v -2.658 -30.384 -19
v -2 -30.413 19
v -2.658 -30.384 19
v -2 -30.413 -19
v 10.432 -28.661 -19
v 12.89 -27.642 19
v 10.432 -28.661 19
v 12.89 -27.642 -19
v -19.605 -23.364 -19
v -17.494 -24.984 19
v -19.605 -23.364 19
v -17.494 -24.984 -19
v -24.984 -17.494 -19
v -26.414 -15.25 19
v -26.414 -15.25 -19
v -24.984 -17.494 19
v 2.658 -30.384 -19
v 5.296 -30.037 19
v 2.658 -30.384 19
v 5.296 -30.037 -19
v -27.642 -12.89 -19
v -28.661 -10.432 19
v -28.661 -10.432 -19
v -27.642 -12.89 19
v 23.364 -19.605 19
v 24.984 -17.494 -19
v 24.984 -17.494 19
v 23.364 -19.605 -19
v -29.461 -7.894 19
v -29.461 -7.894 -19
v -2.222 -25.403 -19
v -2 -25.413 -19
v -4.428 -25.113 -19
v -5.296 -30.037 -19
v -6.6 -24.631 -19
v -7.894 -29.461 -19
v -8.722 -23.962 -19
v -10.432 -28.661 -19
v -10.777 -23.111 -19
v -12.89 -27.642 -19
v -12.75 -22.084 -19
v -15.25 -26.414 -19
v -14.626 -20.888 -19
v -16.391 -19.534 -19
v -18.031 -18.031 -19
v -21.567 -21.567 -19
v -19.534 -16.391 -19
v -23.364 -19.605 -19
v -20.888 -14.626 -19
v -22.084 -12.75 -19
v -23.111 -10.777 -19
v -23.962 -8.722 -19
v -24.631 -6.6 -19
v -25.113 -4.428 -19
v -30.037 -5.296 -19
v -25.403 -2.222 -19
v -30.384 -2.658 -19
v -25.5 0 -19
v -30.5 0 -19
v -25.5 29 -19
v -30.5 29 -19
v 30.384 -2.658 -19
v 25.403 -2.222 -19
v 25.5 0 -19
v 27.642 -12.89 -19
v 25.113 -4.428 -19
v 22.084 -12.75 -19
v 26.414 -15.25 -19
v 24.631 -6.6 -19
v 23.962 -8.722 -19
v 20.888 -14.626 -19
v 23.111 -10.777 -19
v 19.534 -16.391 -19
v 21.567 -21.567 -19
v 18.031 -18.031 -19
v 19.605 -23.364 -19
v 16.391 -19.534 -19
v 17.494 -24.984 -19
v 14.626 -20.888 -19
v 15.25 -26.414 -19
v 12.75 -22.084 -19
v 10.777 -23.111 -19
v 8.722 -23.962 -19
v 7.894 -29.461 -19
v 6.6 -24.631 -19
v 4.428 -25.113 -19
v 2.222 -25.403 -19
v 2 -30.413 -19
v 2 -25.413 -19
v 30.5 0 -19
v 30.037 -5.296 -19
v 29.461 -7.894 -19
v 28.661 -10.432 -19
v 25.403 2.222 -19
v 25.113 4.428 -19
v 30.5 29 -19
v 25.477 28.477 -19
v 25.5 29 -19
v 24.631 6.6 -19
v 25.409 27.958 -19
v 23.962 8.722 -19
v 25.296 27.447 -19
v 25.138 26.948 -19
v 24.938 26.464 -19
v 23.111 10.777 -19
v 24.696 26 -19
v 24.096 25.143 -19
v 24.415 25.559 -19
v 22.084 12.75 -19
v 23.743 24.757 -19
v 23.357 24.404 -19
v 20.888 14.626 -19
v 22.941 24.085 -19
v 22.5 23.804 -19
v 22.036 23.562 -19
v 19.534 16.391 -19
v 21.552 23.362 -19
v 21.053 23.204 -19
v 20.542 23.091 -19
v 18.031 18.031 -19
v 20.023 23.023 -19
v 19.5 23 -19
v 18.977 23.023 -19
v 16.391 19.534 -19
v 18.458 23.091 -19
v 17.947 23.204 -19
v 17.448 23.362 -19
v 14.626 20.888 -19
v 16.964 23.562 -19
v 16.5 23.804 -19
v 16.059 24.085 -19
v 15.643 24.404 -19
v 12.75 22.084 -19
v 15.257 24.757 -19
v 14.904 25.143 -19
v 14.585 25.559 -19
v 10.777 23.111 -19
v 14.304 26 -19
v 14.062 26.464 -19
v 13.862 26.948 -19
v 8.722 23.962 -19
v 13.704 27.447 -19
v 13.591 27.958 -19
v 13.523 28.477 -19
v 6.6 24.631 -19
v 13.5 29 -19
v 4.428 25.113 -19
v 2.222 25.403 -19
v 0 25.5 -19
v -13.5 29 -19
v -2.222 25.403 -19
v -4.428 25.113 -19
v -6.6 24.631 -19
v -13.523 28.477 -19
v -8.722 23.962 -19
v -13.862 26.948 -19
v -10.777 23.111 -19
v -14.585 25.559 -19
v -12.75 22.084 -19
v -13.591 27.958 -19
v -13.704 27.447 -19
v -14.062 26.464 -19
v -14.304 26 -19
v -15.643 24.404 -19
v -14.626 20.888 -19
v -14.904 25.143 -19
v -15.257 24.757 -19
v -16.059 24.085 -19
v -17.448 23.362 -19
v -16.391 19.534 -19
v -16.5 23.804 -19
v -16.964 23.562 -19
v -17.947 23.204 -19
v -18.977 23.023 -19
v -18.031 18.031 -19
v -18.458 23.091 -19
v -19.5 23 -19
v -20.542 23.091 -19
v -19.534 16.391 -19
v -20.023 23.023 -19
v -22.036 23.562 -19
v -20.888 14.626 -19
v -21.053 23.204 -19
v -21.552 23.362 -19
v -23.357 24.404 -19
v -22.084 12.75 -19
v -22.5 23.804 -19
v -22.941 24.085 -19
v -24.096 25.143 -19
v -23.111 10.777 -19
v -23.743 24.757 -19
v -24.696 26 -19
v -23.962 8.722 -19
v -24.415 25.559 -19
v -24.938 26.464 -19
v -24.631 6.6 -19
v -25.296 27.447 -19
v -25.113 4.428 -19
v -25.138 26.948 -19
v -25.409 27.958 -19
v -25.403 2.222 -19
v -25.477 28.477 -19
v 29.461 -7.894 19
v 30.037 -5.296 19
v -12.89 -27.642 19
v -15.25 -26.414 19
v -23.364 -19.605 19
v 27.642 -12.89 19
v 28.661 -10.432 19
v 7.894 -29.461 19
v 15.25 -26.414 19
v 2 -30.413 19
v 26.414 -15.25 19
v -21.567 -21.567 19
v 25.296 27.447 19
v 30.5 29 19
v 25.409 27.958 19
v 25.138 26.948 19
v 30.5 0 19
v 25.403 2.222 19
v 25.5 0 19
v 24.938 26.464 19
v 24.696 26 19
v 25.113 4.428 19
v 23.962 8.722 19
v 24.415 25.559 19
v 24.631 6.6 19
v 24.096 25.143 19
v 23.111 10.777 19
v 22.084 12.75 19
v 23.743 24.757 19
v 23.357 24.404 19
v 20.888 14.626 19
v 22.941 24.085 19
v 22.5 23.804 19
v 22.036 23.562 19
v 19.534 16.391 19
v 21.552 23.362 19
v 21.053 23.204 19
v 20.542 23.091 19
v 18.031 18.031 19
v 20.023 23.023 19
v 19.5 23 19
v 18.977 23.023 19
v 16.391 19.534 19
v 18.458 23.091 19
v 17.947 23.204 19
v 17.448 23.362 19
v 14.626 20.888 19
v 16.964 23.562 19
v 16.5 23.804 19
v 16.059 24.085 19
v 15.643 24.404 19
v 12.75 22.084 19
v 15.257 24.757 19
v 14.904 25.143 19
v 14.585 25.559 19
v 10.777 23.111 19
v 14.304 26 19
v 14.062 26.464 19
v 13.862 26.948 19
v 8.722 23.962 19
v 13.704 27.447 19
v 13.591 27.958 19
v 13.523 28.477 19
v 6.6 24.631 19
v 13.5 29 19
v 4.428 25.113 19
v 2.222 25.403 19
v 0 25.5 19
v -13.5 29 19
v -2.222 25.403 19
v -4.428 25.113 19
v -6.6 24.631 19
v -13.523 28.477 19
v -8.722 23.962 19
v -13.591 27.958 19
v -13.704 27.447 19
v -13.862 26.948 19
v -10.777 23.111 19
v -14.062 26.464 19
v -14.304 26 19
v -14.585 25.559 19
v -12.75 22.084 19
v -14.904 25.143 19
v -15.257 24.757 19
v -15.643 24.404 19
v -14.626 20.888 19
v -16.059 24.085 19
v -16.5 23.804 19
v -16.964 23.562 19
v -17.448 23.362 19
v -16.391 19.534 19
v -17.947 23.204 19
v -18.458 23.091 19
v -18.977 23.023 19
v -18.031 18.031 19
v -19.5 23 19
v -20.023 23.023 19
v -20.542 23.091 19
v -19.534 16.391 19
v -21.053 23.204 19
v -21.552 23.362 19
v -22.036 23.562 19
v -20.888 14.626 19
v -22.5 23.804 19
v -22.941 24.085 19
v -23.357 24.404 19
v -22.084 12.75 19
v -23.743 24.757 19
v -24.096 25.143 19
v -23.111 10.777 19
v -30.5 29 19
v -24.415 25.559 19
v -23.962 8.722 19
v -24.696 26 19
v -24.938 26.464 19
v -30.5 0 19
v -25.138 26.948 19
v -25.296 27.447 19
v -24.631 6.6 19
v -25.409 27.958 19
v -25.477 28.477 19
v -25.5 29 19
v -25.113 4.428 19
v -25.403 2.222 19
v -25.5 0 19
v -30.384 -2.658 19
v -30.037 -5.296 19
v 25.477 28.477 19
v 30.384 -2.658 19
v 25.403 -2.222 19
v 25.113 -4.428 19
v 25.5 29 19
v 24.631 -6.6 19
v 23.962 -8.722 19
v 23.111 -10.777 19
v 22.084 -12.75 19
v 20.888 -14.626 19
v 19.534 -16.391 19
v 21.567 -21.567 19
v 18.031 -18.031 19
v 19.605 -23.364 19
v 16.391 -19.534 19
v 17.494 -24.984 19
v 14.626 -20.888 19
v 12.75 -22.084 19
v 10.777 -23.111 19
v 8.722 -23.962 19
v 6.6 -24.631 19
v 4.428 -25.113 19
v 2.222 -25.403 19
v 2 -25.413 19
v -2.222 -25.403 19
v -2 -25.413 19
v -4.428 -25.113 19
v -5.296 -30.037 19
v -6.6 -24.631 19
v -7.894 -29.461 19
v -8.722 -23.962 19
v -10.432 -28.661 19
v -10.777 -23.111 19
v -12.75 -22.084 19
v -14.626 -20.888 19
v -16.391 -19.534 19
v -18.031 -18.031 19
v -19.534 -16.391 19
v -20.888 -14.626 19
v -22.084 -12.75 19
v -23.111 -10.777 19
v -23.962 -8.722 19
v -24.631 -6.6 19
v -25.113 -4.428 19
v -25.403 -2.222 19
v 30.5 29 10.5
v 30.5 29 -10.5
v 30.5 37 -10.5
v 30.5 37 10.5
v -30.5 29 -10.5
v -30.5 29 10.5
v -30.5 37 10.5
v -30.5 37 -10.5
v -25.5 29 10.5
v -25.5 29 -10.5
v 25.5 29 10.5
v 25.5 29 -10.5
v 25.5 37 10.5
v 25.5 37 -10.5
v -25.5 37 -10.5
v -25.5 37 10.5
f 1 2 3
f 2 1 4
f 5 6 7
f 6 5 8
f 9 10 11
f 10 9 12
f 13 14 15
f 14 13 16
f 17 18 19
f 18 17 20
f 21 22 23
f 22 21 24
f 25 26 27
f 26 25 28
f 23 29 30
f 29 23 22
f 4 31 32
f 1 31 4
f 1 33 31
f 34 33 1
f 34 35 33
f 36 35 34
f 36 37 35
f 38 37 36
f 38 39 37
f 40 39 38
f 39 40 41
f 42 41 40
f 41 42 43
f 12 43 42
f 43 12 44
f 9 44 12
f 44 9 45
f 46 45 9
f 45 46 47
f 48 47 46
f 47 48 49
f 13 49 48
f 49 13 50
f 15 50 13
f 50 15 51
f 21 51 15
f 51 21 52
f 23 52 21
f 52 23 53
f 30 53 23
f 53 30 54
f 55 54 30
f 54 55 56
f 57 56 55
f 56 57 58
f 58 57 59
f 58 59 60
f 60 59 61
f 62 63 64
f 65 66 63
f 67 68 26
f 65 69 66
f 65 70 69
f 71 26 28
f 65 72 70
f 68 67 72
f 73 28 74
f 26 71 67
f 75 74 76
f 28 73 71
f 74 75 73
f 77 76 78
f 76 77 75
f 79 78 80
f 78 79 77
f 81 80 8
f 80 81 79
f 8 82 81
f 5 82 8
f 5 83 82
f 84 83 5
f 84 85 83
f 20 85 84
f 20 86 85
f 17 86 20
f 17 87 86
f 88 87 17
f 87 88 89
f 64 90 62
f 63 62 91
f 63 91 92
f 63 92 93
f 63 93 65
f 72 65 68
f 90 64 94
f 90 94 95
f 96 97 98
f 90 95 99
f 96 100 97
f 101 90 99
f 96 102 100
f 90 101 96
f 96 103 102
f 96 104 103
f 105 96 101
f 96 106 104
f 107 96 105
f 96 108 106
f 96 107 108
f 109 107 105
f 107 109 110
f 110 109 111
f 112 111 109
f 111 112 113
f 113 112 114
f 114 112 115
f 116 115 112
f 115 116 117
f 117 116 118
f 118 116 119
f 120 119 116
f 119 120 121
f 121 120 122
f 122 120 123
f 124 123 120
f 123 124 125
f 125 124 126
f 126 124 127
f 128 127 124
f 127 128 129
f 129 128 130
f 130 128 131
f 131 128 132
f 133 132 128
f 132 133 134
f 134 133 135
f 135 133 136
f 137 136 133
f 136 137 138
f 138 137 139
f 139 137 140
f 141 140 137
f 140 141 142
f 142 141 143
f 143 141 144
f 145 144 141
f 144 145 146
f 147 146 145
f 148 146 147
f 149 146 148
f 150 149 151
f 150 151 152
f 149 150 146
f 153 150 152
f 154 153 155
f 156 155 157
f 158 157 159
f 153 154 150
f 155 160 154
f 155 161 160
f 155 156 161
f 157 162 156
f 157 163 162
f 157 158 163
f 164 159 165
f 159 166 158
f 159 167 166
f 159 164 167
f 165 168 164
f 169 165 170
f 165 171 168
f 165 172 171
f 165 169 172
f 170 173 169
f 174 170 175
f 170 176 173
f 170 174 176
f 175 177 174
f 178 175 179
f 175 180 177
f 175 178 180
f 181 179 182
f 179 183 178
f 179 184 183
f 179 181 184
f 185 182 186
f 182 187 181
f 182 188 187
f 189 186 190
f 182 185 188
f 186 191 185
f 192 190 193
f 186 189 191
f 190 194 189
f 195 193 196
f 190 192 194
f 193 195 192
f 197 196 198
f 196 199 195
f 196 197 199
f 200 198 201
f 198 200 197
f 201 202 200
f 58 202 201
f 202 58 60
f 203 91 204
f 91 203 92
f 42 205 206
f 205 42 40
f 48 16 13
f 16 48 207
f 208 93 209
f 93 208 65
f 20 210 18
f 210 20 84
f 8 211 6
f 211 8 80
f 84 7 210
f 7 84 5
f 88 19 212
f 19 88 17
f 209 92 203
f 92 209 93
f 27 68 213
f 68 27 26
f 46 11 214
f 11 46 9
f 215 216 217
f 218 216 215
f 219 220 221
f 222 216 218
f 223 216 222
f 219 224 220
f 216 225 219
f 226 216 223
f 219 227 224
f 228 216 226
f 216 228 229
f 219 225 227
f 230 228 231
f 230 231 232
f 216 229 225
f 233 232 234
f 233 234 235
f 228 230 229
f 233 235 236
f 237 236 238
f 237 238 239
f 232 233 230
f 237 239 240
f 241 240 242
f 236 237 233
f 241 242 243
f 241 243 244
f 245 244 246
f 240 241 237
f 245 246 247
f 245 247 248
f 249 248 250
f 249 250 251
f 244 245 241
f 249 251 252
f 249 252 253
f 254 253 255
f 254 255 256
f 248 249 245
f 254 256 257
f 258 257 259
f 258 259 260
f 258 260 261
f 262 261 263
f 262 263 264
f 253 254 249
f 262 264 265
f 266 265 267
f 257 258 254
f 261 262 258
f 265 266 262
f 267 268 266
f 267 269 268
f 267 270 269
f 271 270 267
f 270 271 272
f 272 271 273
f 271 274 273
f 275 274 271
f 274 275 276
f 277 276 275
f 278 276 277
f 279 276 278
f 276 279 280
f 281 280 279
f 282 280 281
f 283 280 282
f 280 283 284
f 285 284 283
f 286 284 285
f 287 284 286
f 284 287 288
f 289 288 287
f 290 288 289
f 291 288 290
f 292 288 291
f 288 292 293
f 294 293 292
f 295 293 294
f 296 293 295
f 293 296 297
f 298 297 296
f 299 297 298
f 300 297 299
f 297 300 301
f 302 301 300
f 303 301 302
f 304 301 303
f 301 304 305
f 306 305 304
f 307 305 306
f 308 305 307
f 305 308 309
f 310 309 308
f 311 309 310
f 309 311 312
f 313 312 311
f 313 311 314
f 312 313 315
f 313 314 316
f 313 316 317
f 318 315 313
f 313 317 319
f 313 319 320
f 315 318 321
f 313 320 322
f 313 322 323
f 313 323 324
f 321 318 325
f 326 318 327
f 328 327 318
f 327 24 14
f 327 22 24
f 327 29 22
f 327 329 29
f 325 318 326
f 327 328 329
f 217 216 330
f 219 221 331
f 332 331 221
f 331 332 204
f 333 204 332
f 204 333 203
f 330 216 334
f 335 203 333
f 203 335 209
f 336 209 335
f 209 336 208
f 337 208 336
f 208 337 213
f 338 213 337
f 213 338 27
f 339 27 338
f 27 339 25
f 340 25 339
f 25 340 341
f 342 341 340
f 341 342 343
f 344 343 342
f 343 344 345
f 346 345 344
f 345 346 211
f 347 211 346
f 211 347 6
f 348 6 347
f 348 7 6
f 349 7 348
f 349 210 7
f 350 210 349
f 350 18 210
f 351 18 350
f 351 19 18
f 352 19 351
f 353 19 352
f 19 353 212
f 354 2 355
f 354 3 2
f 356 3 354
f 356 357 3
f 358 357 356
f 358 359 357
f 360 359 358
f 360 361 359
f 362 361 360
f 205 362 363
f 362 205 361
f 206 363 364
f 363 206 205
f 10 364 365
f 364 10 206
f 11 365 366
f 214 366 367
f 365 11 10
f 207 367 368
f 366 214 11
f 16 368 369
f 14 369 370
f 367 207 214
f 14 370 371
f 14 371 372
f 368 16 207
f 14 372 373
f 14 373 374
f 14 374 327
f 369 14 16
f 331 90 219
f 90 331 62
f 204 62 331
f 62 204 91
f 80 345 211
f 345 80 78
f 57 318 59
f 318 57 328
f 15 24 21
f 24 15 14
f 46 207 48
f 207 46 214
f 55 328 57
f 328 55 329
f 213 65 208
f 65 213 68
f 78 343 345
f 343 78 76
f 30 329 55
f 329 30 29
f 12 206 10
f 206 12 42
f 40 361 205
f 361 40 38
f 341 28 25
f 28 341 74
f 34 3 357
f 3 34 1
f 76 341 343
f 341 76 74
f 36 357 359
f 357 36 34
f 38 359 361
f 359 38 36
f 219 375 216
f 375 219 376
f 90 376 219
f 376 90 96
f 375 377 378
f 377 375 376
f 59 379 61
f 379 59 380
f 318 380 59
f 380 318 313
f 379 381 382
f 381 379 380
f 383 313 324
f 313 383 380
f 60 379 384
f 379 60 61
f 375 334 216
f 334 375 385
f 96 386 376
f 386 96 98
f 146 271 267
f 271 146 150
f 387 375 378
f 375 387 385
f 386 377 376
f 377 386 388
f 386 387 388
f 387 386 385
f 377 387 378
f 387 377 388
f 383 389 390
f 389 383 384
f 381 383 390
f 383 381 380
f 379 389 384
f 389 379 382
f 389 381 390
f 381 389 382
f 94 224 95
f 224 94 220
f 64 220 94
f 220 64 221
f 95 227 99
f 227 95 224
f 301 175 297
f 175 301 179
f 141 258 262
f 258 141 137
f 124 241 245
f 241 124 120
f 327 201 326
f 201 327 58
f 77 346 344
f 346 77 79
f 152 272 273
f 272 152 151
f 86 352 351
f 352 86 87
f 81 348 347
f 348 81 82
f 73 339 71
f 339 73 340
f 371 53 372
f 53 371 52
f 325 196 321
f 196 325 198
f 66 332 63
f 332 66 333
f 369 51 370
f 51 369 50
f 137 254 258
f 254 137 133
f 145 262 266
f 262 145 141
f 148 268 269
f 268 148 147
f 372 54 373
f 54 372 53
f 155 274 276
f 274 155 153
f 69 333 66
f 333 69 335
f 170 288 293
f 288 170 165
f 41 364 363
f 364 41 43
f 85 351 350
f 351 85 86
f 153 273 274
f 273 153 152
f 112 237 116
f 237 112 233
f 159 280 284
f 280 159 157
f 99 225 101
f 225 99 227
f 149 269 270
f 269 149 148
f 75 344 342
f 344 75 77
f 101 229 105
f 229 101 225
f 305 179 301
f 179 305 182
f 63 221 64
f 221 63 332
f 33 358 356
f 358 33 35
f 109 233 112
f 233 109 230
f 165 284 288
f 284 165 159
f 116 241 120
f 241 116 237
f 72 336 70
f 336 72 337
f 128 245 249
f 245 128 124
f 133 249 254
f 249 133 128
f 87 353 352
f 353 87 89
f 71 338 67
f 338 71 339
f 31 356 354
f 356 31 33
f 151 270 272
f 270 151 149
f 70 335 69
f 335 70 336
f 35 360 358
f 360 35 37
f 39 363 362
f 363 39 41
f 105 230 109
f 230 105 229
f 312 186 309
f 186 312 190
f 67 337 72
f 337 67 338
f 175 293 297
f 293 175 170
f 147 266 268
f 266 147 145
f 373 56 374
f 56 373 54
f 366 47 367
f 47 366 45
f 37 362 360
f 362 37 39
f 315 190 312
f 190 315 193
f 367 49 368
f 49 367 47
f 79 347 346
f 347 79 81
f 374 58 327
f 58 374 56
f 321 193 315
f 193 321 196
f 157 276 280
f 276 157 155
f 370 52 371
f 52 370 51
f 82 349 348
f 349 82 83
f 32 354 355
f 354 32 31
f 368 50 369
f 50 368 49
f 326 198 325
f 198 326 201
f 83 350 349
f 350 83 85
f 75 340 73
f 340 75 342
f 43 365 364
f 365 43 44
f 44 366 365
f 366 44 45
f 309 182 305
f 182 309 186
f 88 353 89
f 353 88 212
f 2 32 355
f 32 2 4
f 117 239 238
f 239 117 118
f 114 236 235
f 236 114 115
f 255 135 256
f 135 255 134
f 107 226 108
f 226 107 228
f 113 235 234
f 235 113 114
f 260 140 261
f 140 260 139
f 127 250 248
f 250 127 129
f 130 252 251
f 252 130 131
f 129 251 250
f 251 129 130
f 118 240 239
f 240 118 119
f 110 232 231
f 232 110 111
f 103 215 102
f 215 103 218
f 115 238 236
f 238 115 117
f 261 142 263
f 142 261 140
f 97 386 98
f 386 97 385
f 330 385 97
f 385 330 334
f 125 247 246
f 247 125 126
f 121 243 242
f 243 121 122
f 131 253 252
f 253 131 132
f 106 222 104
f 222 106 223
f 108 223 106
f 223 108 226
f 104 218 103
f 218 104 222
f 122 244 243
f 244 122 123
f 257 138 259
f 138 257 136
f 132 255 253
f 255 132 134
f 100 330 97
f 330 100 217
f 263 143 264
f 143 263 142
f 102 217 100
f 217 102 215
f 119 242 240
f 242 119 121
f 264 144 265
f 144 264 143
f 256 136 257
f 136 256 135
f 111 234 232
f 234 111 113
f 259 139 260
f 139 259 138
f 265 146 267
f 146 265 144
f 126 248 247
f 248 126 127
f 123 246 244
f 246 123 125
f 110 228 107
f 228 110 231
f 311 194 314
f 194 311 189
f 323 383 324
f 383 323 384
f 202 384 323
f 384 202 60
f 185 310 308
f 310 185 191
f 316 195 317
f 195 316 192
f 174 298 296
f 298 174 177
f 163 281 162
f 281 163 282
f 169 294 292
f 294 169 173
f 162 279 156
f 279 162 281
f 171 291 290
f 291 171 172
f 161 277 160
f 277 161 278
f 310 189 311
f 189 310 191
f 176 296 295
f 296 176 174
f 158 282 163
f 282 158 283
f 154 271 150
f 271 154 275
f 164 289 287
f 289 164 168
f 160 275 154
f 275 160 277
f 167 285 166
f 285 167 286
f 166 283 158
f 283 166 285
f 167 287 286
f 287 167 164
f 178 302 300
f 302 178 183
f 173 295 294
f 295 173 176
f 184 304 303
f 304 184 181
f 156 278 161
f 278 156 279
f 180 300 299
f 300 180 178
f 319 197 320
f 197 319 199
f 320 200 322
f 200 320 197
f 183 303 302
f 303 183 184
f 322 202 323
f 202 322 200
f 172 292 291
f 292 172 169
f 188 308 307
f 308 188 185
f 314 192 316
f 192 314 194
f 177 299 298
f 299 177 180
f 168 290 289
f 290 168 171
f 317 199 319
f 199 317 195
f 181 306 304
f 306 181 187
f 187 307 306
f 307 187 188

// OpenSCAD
width = 61; // 61 for 2 inch SS clamps
width_peg = 5;
width_slit = 4;
length = 58; // 58 for 2 inch SS clamps
length_peg = 8;
height = 38;
height_peg = 21;
dia_hole = 51;
dia_channel = 12;


module peg() {
  cube([width_peg, length_peg, height_peg], center=true);
};


module shell() {
  difference() {
    cylinder(h=height, d=width, center=true);
    translate([0,0.75*width,0]) cube([width, width, height], center=true);
  }
  translate([0,0.25*length,0]) cube([width, 0.5*length, height], center=true);
  
  x_peg = 0.5*(width - width_peg);
  y_peg = 0.5*(length + length_peg);
  translate([x_peg, y_peg, 0]) peg();
  translate([-x_peg, y_peg, 0]) peg();
};


module clamp() {
  difference() {
    shell();
    cylinder(h=1.1*height, d=dia_hole, center=true);
    translate([0, -0.5*length, 0]) cube([width_slit, 1.1*length, 1.1*height], center=true);
    x_chan = 0.5*(width - dia_channel) - width_peg;
    y_chan = 0.5*length;
    translate([x_chan, y_chan, 0]) cylinder(h=1.1*height, d=dia_channel, center=true);
    translate([-x_chan, y_chan, 0]) cylinder(h=1.1*height, d=dia_channel, center=true);
  };
};

clamp($fn=72);
